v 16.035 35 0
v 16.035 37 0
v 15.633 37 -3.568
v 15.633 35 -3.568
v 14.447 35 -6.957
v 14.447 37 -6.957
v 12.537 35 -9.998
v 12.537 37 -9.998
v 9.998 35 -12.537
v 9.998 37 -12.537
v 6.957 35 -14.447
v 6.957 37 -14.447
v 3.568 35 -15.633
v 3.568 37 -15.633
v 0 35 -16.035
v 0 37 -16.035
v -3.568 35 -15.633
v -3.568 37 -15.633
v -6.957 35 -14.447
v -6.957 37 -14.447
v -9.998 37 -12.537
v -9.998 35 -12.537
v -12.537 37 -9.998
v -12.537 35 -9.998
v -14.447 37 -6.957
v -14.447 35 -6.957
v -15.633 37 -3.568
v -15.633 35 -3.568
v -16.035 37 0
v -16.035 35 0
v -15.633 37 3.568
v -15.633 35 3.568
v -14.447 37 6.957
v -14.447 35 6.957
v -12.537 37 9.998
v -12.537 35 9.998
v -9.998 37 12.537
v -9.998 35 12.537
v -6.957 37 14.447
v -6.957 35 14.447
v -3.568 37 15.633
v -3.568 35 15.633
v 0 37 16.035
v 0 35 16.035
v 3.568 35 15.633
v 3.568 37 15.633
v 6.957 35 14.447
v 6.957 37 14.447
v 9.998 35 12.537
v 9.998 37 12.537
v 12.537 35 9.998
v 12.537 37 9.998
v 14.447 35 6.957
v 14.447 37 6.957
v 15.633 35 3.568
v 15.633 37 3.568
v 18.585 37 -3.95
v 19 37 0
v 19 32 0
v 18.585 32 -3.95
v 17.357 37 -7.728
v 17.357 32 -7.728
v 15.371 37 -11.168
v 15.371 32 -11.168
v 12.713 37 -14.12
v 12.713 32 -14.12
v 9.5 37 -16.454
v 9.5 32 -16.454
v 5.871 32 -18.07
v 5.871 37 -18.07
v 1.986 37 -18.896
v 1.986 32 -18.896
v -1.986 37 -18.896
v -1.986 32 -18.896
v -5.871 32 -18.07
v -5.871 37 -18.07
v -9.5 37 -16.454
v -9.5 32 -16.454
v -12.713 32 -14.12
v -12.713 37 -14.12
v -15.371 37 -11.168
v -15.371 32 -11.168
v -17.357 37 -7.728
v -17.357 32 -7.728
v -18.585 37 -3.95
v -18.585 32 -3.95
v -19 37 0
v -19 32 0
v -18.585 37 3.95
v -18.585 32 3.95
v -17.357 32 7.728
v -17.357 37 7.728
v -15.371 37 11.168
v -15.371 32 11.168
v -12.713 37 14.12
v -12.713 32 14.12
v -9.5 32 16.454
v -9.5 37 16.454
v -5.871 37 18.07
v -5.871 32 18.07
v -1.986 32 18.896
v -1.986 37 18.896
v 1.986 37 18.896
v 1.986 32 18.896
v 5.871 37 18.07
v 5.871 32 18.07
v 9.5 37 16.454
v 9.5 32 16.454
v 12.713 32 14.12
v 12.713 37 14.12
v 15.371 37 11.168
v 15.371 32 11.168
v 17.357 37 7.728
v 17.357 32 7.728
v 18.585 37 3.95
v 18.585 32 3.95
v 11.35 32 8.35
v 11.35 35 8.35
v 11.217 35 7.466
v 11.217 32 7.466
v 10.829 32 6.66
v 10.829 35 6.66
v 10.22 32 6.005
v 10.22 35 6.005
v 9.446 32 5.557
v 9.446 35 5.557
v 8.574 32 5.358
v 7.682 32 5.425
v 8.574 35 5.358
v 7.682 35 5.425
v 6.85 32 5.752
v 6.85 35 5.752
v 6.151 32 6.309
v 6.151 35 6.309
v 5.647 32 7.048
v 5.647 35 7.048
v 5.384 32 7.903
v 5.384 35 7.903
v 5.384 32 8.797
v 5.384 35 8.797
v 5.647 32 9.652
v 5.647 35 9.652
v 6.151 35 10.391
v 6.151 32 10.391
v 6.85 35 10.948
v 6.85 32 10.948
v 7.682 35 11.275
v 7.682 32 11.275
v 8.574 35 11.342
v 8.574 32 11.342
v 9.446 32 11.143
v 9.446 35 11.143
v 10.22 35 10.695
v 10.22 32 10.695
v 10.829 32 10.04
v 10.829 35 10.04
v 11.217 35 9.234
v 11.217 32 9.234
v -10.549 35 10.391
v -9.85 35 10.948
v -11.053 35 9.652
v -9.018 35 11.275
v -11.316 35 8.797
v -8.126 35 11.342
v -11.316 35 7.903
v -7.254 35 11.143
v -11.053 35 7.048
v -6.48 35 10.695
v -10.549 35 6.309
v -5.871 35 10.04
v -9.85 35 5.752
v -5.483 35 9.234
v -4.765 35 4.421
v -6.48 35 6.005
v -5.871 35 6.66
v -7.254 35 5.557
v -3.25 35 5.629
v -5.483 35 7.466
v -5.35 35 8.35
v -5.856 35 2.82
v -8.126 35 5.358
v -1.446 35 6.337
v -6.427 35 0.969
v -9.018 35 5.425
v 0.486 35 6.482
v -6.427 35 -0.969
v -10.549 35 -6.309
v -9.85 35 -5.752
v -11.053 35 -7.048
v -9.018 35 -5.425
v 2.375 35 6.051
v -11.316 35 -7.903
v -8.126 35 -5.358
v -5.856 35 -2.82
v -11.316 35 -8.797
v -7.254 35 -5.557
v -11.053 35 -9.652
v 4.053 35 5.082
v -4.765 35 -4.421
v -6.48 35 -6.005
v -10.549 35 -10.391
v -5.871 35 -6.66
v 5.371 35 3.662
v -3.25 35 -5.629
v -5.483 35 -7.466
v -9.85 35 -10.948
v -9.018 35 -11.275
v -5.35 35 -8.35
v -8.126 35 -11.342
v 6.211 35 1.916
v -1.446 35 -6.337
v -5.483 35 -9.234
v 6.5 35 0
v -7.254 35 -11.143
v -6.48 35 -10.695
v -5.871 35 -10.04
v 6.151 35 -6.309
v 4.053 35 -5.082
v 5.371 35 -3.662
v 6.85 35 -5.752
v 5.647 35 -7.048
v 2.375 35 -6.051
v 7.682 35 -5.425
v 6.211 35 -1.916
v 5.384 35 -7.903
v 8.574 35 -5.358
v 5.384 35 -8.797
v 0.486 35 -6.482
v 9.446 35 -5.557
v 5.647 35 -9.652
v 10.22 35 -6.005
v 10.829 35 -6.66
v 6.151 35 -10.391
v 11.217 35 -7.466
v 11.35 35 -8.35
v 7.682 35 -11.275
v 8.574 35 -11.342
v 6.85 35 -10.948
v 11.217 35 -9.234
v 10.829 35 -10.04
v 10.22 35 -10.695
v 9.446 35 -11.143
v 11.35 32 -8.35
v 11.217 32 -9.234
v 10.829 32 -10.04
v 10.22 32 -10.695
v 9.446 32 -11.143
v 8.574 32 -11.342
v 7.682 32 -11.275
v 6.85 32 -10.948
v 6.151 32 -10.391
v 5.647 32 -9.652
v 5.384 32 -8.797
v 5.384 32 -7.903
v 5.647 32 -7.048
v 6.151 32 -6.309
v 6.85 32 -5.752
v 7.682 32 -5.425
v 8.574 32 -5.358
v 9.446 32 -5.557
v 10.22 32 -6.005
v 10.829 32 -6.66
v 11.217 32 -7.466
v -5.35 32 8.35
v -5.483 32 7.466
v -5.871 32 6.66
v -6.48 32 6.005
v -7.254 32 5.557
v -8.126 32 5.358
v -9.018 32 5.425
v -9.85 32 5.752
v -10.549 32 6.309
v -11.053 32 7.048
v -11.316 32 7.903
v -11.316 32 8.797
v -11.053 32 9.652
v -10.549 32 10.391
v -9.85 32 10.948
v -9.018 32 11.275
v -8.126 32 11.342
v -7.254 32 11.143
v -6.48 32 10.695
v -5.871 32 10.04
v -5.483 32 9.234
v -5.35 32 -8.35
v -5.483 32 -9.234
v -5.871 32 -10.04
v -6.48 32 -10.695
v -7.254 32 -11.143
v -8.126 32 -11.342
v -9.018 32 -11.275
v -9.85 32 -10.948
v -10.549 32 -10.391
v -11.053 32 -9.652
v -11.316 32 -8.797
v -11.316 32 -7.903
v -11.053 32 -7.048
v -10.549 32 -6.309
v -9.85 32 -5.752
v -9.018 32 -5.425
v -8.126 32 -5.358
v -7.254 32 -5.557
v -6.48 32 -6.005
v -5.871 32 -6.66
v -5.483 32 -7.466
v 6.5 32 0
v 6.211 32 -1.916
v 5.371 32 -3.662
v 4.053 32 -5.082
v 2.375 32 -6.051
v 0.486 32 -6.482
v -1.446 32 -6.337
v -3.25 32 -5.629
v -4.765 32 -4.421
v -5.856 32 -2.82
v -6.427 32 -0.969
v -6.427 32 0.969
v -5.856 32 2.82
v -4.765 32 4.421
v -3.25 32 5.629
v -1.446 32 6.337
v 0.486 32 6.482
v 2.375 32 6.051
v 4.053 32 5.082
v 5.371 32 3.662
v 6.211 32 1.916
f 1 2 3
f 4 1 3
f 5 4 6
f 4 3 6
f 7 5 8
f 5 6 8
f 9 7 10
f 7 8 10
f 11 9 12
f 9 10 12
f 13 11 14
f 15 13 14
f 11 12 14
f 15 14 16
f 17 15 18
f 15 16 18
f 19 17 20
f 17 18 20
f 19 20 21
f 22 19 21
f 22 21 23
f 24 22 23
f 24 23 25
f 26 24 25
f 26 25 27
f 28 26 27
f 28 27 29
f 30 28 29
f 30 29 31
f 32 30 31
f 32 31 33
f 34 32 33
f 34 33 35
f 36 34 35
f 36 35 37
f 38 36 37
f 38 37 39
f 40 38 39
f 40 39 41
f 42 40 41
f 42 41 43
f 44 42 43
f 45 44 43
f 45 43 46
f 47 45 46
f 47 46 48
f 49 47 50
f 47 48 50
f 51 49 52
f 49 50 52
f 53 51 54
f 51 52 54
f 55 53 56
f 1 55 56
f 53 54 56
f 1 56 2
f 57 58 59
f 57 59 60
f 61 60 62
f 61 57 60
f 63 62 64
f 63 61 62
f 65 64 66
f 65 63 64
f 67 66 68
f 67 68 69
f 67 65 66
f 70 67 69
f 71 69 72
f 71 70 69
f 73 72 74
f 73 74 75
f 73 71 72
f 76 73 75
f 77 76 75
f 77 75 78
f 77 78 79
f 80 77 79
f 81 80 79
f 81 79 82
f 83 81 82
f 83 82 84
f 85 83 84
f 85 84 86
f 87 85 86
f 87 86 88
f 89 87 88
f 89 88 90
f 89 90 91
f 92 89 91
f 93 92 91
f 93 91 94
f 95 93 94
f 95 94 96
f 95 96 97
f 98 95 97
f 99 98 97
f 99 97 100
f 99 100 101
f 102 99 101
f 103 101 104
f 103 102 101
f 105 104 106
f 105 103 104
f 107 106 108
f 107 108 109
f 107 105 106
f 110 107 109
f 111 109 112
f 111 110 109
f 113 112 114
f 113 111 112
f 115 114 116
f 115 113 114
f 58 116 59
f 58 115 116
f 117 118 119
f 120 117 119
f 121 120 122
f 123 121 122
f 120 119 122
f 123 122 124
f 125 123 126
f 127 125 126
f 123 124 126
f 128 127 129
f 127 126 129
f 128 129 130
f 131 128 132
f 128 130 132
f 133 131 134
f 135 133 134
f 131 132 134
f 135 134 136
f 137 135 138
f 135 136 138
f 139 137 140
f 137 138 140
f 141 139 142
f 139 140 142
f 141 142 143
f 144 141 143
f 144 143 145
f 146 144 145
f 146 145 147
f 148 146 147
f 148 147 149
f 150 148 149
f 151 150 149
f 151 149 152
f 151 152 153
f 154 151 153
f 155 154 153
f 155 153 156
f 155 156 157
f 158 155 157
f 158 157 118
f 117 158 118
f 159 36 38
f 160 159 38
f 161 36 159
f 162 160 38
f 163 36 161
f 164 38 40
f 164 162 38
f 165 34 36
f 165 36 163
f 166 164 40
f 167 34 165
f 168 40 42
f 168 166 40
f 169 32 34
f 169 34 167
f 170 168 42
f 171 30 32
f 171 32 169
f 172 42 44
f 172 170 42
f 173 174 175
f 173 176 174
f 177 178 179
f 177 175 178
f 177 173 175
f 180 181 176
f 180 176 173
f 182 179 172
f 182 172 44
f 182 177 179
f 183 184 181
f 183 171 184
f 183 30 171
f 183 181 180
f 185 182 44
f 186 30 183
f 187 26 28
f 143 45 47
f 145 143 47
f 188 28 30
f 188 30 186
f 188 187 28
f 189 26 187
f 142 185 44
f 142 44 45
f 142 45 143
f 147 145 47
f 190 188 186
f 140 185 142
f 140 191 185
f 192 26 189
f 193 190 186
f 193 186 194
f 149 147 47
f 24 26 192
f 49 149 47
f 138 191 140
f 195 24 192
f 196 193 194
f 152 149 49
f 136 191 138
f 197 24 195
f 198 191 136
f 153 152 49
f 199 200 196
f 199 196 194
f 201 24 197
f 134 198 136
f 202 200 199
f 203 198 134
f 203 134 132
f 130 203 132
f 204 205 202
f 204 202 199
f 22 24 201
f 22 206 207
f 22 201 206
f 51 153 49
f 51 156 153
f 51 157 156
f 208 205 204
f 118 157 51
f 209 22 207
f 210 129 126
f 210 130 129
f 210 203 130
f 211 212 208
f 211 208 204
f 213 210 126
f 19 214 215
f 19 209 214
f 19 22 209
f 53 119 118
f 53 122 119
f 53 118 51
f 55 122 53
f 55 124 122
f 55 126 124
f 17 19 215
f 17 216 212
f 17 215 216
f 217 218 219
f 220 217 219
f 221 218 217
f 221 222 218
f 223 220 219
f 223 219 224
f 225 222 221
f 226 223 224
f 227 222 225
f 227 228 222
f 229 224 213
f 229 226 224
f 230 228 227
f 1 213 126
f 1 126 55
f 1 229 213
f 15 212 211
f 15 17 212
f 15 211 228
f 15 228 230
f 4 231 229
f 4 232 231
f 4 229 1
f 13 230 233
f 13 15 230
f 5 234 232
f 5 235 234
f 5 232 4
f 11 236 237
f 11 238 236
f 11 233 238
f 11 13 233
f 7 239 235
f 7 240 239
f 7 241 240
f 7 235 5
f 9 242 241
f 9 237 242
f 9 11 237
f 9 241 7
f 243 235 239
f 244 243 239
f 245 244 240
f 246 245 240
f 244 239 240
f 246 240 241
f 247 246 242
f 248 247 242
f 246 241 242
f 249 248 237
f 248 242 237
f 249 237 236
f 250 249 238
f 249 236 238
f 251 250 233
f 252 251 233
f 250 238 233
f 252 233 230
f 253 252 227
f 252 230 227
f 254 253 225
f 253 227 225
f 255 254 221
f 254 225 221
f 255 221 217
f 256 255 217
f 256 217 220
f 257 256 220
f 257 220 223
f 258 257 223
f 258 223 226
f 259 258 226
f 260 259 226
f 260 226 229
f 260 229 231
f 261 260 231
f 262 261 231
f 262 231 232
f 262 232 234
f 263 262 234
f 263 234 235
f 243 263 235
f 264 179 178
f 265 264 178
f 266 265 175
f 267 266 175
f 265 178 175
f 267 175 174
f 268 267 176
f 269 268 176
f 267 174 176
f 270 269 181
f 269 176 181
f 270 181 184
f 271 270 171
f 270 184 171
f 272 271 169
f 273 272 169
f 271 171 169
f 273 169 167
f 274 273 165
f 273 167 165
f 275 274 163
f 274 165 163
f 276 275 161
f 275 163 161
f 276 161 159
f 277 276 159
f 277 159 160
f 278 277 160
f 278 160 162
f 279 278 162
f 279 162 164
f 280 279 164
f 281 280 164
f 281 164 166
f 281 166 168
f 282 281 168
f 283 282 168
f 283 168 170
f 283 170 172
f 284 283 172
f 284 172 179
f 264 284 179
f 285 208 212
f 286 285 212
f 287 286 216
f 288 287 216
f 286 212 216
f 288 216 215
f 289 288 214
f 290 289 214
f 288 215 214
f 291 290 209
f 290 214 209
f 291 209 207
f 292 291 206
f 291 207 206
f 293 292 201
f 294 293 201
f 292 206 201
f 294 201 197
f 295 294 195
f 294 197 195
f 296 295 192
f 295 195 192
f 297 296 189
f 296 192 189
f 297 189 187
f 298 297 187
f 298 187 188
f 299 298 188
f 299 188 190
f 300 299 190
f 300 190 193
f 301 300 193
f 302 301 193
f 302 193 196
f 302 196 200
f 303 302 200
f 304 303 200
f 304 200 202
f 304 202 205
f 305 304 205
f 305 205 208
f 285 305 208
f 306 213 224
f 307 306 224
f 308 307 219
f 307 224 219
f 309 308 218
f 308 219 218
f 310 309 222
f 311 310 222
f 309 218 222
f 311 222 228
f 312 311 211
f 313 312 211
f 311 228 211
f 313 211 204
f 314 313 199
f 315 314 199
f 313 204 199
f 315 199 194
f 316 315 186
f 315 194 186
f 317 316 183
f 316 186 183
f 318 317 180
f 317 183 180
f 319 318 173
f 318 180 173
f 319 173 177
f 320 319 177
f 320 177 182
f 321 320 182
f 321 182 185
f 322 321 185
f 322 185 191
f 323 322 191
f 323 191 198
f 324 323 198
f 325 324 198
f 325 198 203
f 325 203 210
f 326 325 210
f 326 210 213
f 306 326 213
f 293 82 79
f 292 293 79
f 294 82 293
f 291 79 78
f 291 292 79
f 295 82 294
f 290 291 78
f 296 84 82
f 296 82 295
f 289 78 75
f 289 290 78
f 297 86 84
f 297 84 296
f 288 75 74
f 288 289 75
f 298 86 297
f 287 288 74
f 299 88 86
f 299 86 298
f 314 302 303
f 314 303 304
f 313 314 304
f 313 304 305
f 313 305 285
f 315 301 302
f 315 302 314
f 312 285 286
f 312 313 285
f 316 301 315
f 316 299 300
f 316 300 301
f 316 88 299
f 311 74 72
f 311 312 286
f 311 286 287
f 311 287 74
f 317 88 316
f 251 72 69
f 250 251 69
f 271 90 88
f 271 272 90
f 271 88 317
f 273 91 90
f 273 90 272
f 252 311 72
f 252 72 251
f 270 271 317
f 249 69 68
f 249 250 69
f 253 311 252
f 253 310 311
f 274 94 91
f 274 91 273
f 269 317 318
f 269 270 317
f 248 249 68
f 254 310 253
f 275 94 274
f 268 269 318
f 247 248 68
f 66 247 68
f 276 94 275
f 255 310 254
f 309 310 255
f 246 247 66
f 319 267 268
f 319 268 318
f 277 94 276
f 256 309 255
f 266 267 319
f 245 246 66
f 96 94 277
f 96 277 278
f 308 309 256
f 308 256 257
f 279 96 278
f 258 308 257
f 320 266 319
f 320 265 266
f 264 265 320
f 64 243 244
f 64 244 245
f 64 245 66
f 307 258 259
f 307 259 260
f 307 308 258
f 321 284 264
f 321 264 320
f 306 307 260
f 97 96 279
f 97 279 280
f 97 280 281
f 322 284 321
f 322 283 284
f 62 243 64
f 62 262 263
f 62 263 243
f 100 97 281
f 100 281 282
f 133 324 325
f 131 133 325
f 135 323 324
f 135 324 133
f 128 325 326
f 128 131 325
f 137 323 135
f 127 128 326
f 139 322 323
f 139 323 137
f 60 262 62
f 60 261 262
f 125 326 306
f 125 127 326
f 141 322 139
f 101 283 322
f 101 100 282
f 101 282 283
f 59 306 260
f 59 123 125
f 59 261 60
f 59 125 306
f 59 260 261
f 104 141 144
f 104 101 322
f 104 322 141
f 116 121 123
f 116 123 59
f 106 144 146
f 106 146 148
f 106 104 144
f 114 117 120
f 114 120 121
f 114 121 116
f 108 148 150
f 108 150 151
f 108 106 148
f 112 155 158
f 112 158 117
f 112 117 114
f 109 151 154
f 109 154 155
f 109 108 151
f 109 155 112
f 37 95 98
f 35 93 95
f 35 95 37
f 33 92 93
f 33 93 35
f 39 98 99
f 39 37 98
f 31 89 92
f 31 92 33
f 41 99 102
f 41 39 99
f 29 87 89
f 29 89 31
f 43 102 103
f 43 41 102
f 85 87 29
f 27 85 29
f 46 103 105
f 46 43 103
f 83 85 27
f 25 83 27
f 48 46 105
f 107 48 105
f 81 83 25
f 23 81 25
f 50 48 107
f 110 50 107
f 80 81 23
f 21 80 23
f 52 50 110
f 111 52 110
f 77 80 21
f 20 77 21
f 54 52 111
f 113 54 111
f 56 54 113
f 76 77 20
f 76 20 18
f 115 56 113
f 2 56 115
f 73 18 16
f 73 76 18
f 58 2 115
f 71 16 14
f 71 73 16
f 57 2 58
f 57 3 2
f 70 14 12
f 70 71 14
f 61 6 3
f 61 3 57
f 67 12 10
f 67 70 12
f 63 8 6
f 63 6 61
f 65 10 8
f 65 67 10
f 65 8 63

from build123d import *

# Parameters (mm, degrees)
SKETCH1_R           = 105
BOSS_EXTRUDE1_DEPTH = 40
SKETCH3_R           = 6.5
CUT_EXTRUDE2_DEPTH  = 40
SKETCH4_R           = 16.035
CUT_EXTRUDE3_DEPTH  = 5
SKETCH8_R           = 3
CUT_EXTRUDE6_DEPTH  = 44.5
SKETCH11_R          = 90
SKETCH11_R_2        = 26.035
CUT_EXTRUDE8_DEPTH  = 10
BOSS_EXTRUDE2_START = -3
SKETCH12_R          = 108
SKETCH12_R_2        = 105
BOSS_EXTRUDE2_DEPTH = 3
SKETCH13_R          = 108
SKETCH13_R_2        = 19
CUT_EXTRUDE9_DEPTH  = 158.886034848
SKETCH14_R          = 27.444507403
CUT_EXTRUDE10_DEPTH = 32
SKETCH15_R          = 19
CUT_EXTRUDE11_DEPTH = 3


with BuildPart() as part:
    # Sketch1 → Boss-Extrude1 (new body)
    with BuildSketch(Plane(origin=(0, 0, 0), x_dir=(1, 0, 0), z_dir=(0, 1, 0))):
        Circle(SKETCH1_R)
    extrude(amount=BOSS_EXTRUDE1_DEPTH)

    # Sketch3 → Cut-Extrude2 (cut)
    with BuildSketch(Plane(origin=(0, 40, 0), x_dir=(1, 0, 0), z_dir=(0, 1, 0))):
        Circle(SKETCH3_R)
    extrude(amount=-CUT_EXTRUDE2_DEPTH, mode=Mode.SUBTRACT)

    # Sketch4 → Cut-Extrude3 (cut)
    with BuildSketch(Plane(origin=(0, 40, 0), x_dir=(1, 0, 0), z_dir=(0, 1, 0))):
        Circle(SKETCH4_R)
    extrude(amount=-CUT_EXTRUDE3_DEPTH, mode=Mode.SUBTRACT)

    # Sketch8 → Cut-Extrude6 (cut)
    with BuildSketch(Plane(origin=(0, 35, 0), x_dir=(1, 0, 0), z_dir=(0, 1, 0))):
        with Locations((-8.35, 8.35)):
            Circle(SKETCH8_R)
        with Locations((8.35, 8.35)):
            Circle(SKETCH8_R)
        with Locations((8.35, -8.35)):
            Circle(SKETCH8_R)
        with Locations((-8.35, -8.35)):
            Circle(SKETCH8_R)
    extrude(amount=-CUT_EXTRUDE6_DEPTH, mode=Mode.SUBTRACT)

    # Sketch11 → Cut-Extrude8 (cut)
    with BuildSketch(Plane(origin=(0, 40, 0), x_dir=(1, 0, 0), z_dir=(0, 1, 0))):
        Circle(SKETCH11_R)
        Circle(SKETCH11_R_2, mode=Mode.SUBTRACT)
    extrude(amount=-CUT_EXTRUDE8_DEPTH, mode=Mode.SUBTRACT)

    # Sketch12 → Boss-Extrude2 (add)
    with BuildSketch(Plane(origin=(0, 40, 0), x_dir=(1, 0, 0), z_dir=(0, 1, 0)).offset(BOSS_EXTRUDE2_START)):
        Circle(SKETCH12_R)
        Circle(SKETCH12_R_2, mode=Mode.SUBTRACT)
    boss_extrude2 = extrude(amount=BOSS_EXTRUDE2_DEPTH)

    # Mirror1: Boss-Extrude2 across plane
    add(boss_extrude2.mirror(Plane(origin=(0, 20, 0), x_dir=(0, 0, 1), z_dir=(0, -1, 0))))

    # Sketch13 → Cut-Extrude9 (cut, through all)
    with BuildSketch(Plane(origin=(0, 40, 0), x_dir=(1, 0, 0), z_dir=(0, 1, 0))):
        Circle(SKETCH13_R)
        Circle(SKETCH13_R_2, mode=Mode.SUBTRACT)
    extrude(amount=-CUT_EXTRUDE9_DEPTH, mode=Mode.SUBTRACT)

    # Sketch14 → Cut-Extrude10 (cut)
    with BuildSketch(Plane.XZ):
        Circle(SKETCH14_R)
    extrude(amount=-CUT_EXTRUDE10_DEPTH, mode=Mode.SUBTRACT)

    # Sketch15 → Cut-Extrude11 (cut)
    with BuildSketch(Plane(origin=(0, 40, 0), x_dir=(1, 0, 0), z_dir=(0, 1, 0))):
        Circle(SKETCH15_R)
    extrude(amount=-CUT_EXTRUDE11_DEPTH, mode=Mode.SUBTRACT)


solid = part.part
